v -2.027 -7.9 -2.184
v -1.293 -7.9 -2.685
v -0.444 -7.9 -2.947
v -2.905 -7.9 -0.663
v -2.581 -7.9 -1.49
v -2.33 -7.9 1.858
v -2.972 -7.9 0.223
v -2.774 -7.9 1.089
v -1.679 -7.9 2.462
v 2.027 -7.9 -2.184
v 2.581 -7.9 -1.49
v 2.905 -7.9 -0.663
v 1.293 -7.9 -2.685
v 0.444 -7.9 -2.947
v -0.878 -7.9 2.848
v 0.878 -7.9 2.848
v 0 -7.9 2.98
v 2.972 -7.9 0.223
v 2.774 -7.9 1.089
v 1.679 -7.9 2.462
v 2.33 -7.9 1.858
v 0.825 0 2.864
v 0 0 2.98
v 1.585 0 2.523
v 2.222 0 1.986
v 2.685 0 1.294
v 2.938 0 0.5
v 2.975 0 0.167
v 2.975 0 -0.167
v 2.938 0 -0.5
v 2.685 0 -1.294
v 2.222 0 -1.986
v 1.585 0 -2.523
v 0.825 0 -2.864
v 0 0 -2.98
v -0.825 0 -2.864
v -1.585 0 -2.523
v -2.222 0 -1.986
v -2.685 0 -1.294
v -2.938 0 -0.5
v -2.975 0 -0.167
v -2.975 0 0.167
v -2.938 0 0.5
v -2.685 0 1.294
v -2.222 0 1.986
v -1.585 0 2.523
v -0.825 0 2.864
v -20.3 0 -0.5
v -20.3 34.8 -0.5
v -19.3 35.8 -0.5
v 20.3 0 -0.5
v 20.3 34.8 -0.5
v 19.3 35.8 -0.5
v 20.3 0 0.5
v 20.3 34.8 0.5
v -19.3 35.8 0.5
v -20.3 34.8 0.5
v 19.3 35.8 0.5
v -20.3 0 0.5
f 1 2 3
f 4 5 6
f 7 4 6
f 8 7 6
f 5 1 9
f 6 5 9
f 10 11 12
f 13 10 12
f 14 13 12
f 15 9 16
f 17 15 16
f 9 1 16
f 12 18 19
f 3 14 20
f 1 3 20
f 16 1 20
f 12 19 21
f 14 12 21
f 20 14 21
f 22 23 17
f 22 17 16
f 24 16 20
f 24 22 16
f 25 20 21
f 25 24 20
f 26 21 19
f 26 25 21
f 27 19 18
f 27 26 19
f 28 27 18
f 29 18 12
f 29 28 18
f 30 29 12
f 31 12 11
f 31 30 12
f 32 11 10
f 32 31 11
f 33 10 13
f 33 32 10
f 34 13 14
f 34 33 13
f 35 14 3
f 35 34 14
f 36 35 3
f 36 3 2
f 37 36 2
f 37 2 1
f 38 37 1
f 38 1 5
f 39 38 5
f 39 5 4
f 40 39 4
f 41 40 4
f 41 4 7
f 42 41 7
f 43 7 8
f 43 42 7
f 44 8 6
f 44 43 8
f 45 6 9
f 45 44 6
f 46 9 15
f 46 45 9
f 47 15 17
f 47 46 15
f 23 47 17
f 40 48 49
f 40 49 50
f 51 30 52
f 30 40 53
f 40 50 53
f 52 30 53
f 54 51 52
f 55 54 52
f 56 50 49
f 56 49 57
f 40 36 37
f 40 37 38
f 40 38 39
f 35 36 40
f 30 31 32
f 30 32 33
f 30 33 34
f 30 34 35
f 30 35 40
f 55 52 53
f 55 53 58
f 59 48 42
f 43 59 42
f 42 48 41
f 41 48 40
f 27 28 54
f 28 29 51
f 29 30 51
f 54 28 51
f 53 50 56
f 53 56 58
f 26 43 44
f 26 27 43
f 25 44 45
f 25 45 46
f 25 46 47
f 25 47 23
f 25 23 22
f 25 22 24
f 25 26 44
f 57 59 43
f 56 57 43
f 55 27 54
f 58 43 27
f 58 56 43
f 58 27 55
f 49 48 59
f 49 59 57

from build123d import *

# Parameters (mm, degrees)
ESQUISSE2_R             = 2.98
BOSS_EXTRU_1_DEPTH      = 7.9
BOSS_EXTRU_2_DEPTH      = 0.5
BOSS_EXTRU_2_DEPTH_BACK = 0.5
ESQUISSE3_W             = 40.6
ESQUISSE3_H             = 35.8
CHANFREIN1_SIZE         = 1


with BuildPart() as part:
    # Esquisse2 → Boss.-Extru.1 (new body)
    with BuildSketch(Plane(origin=(0, 0, 0), x_dir=(1, 0, 0), z_dir=(0, 1, 0))):
        Circle(ESQUISSE2_R)
    extrude(amount=-BOSS_EXTRU_1_DEPTH)

    # Esquisse3 → Boss.-Extru.2 (add, two sides: drawn at the far end of the back side and taken through both)
    with BuildSketch(Plane.XY.offset(-BOSS_EXTRU_2_DEPTH_BACK)):
        with Locations((0, 17.9)):
            Rectangle(ESQUISSE3_W, ESQUISSE3_H)
    extrude(amount=BOSS_EXTRU_2_DEPTH + BOSS_EXTRU_2_DEPTH_BACK)

    # Chanfrein1
    chanfrein1_edges = [part.edges().sort_by_distance(p)[0] for p in [
        (-20.3, 35.8, 0),
        (20.3, 35.8, 0),
    ]]
    chamfer(chanfrein1_edges, length=CHANFREIN1_SIZE)


solid = part.part
